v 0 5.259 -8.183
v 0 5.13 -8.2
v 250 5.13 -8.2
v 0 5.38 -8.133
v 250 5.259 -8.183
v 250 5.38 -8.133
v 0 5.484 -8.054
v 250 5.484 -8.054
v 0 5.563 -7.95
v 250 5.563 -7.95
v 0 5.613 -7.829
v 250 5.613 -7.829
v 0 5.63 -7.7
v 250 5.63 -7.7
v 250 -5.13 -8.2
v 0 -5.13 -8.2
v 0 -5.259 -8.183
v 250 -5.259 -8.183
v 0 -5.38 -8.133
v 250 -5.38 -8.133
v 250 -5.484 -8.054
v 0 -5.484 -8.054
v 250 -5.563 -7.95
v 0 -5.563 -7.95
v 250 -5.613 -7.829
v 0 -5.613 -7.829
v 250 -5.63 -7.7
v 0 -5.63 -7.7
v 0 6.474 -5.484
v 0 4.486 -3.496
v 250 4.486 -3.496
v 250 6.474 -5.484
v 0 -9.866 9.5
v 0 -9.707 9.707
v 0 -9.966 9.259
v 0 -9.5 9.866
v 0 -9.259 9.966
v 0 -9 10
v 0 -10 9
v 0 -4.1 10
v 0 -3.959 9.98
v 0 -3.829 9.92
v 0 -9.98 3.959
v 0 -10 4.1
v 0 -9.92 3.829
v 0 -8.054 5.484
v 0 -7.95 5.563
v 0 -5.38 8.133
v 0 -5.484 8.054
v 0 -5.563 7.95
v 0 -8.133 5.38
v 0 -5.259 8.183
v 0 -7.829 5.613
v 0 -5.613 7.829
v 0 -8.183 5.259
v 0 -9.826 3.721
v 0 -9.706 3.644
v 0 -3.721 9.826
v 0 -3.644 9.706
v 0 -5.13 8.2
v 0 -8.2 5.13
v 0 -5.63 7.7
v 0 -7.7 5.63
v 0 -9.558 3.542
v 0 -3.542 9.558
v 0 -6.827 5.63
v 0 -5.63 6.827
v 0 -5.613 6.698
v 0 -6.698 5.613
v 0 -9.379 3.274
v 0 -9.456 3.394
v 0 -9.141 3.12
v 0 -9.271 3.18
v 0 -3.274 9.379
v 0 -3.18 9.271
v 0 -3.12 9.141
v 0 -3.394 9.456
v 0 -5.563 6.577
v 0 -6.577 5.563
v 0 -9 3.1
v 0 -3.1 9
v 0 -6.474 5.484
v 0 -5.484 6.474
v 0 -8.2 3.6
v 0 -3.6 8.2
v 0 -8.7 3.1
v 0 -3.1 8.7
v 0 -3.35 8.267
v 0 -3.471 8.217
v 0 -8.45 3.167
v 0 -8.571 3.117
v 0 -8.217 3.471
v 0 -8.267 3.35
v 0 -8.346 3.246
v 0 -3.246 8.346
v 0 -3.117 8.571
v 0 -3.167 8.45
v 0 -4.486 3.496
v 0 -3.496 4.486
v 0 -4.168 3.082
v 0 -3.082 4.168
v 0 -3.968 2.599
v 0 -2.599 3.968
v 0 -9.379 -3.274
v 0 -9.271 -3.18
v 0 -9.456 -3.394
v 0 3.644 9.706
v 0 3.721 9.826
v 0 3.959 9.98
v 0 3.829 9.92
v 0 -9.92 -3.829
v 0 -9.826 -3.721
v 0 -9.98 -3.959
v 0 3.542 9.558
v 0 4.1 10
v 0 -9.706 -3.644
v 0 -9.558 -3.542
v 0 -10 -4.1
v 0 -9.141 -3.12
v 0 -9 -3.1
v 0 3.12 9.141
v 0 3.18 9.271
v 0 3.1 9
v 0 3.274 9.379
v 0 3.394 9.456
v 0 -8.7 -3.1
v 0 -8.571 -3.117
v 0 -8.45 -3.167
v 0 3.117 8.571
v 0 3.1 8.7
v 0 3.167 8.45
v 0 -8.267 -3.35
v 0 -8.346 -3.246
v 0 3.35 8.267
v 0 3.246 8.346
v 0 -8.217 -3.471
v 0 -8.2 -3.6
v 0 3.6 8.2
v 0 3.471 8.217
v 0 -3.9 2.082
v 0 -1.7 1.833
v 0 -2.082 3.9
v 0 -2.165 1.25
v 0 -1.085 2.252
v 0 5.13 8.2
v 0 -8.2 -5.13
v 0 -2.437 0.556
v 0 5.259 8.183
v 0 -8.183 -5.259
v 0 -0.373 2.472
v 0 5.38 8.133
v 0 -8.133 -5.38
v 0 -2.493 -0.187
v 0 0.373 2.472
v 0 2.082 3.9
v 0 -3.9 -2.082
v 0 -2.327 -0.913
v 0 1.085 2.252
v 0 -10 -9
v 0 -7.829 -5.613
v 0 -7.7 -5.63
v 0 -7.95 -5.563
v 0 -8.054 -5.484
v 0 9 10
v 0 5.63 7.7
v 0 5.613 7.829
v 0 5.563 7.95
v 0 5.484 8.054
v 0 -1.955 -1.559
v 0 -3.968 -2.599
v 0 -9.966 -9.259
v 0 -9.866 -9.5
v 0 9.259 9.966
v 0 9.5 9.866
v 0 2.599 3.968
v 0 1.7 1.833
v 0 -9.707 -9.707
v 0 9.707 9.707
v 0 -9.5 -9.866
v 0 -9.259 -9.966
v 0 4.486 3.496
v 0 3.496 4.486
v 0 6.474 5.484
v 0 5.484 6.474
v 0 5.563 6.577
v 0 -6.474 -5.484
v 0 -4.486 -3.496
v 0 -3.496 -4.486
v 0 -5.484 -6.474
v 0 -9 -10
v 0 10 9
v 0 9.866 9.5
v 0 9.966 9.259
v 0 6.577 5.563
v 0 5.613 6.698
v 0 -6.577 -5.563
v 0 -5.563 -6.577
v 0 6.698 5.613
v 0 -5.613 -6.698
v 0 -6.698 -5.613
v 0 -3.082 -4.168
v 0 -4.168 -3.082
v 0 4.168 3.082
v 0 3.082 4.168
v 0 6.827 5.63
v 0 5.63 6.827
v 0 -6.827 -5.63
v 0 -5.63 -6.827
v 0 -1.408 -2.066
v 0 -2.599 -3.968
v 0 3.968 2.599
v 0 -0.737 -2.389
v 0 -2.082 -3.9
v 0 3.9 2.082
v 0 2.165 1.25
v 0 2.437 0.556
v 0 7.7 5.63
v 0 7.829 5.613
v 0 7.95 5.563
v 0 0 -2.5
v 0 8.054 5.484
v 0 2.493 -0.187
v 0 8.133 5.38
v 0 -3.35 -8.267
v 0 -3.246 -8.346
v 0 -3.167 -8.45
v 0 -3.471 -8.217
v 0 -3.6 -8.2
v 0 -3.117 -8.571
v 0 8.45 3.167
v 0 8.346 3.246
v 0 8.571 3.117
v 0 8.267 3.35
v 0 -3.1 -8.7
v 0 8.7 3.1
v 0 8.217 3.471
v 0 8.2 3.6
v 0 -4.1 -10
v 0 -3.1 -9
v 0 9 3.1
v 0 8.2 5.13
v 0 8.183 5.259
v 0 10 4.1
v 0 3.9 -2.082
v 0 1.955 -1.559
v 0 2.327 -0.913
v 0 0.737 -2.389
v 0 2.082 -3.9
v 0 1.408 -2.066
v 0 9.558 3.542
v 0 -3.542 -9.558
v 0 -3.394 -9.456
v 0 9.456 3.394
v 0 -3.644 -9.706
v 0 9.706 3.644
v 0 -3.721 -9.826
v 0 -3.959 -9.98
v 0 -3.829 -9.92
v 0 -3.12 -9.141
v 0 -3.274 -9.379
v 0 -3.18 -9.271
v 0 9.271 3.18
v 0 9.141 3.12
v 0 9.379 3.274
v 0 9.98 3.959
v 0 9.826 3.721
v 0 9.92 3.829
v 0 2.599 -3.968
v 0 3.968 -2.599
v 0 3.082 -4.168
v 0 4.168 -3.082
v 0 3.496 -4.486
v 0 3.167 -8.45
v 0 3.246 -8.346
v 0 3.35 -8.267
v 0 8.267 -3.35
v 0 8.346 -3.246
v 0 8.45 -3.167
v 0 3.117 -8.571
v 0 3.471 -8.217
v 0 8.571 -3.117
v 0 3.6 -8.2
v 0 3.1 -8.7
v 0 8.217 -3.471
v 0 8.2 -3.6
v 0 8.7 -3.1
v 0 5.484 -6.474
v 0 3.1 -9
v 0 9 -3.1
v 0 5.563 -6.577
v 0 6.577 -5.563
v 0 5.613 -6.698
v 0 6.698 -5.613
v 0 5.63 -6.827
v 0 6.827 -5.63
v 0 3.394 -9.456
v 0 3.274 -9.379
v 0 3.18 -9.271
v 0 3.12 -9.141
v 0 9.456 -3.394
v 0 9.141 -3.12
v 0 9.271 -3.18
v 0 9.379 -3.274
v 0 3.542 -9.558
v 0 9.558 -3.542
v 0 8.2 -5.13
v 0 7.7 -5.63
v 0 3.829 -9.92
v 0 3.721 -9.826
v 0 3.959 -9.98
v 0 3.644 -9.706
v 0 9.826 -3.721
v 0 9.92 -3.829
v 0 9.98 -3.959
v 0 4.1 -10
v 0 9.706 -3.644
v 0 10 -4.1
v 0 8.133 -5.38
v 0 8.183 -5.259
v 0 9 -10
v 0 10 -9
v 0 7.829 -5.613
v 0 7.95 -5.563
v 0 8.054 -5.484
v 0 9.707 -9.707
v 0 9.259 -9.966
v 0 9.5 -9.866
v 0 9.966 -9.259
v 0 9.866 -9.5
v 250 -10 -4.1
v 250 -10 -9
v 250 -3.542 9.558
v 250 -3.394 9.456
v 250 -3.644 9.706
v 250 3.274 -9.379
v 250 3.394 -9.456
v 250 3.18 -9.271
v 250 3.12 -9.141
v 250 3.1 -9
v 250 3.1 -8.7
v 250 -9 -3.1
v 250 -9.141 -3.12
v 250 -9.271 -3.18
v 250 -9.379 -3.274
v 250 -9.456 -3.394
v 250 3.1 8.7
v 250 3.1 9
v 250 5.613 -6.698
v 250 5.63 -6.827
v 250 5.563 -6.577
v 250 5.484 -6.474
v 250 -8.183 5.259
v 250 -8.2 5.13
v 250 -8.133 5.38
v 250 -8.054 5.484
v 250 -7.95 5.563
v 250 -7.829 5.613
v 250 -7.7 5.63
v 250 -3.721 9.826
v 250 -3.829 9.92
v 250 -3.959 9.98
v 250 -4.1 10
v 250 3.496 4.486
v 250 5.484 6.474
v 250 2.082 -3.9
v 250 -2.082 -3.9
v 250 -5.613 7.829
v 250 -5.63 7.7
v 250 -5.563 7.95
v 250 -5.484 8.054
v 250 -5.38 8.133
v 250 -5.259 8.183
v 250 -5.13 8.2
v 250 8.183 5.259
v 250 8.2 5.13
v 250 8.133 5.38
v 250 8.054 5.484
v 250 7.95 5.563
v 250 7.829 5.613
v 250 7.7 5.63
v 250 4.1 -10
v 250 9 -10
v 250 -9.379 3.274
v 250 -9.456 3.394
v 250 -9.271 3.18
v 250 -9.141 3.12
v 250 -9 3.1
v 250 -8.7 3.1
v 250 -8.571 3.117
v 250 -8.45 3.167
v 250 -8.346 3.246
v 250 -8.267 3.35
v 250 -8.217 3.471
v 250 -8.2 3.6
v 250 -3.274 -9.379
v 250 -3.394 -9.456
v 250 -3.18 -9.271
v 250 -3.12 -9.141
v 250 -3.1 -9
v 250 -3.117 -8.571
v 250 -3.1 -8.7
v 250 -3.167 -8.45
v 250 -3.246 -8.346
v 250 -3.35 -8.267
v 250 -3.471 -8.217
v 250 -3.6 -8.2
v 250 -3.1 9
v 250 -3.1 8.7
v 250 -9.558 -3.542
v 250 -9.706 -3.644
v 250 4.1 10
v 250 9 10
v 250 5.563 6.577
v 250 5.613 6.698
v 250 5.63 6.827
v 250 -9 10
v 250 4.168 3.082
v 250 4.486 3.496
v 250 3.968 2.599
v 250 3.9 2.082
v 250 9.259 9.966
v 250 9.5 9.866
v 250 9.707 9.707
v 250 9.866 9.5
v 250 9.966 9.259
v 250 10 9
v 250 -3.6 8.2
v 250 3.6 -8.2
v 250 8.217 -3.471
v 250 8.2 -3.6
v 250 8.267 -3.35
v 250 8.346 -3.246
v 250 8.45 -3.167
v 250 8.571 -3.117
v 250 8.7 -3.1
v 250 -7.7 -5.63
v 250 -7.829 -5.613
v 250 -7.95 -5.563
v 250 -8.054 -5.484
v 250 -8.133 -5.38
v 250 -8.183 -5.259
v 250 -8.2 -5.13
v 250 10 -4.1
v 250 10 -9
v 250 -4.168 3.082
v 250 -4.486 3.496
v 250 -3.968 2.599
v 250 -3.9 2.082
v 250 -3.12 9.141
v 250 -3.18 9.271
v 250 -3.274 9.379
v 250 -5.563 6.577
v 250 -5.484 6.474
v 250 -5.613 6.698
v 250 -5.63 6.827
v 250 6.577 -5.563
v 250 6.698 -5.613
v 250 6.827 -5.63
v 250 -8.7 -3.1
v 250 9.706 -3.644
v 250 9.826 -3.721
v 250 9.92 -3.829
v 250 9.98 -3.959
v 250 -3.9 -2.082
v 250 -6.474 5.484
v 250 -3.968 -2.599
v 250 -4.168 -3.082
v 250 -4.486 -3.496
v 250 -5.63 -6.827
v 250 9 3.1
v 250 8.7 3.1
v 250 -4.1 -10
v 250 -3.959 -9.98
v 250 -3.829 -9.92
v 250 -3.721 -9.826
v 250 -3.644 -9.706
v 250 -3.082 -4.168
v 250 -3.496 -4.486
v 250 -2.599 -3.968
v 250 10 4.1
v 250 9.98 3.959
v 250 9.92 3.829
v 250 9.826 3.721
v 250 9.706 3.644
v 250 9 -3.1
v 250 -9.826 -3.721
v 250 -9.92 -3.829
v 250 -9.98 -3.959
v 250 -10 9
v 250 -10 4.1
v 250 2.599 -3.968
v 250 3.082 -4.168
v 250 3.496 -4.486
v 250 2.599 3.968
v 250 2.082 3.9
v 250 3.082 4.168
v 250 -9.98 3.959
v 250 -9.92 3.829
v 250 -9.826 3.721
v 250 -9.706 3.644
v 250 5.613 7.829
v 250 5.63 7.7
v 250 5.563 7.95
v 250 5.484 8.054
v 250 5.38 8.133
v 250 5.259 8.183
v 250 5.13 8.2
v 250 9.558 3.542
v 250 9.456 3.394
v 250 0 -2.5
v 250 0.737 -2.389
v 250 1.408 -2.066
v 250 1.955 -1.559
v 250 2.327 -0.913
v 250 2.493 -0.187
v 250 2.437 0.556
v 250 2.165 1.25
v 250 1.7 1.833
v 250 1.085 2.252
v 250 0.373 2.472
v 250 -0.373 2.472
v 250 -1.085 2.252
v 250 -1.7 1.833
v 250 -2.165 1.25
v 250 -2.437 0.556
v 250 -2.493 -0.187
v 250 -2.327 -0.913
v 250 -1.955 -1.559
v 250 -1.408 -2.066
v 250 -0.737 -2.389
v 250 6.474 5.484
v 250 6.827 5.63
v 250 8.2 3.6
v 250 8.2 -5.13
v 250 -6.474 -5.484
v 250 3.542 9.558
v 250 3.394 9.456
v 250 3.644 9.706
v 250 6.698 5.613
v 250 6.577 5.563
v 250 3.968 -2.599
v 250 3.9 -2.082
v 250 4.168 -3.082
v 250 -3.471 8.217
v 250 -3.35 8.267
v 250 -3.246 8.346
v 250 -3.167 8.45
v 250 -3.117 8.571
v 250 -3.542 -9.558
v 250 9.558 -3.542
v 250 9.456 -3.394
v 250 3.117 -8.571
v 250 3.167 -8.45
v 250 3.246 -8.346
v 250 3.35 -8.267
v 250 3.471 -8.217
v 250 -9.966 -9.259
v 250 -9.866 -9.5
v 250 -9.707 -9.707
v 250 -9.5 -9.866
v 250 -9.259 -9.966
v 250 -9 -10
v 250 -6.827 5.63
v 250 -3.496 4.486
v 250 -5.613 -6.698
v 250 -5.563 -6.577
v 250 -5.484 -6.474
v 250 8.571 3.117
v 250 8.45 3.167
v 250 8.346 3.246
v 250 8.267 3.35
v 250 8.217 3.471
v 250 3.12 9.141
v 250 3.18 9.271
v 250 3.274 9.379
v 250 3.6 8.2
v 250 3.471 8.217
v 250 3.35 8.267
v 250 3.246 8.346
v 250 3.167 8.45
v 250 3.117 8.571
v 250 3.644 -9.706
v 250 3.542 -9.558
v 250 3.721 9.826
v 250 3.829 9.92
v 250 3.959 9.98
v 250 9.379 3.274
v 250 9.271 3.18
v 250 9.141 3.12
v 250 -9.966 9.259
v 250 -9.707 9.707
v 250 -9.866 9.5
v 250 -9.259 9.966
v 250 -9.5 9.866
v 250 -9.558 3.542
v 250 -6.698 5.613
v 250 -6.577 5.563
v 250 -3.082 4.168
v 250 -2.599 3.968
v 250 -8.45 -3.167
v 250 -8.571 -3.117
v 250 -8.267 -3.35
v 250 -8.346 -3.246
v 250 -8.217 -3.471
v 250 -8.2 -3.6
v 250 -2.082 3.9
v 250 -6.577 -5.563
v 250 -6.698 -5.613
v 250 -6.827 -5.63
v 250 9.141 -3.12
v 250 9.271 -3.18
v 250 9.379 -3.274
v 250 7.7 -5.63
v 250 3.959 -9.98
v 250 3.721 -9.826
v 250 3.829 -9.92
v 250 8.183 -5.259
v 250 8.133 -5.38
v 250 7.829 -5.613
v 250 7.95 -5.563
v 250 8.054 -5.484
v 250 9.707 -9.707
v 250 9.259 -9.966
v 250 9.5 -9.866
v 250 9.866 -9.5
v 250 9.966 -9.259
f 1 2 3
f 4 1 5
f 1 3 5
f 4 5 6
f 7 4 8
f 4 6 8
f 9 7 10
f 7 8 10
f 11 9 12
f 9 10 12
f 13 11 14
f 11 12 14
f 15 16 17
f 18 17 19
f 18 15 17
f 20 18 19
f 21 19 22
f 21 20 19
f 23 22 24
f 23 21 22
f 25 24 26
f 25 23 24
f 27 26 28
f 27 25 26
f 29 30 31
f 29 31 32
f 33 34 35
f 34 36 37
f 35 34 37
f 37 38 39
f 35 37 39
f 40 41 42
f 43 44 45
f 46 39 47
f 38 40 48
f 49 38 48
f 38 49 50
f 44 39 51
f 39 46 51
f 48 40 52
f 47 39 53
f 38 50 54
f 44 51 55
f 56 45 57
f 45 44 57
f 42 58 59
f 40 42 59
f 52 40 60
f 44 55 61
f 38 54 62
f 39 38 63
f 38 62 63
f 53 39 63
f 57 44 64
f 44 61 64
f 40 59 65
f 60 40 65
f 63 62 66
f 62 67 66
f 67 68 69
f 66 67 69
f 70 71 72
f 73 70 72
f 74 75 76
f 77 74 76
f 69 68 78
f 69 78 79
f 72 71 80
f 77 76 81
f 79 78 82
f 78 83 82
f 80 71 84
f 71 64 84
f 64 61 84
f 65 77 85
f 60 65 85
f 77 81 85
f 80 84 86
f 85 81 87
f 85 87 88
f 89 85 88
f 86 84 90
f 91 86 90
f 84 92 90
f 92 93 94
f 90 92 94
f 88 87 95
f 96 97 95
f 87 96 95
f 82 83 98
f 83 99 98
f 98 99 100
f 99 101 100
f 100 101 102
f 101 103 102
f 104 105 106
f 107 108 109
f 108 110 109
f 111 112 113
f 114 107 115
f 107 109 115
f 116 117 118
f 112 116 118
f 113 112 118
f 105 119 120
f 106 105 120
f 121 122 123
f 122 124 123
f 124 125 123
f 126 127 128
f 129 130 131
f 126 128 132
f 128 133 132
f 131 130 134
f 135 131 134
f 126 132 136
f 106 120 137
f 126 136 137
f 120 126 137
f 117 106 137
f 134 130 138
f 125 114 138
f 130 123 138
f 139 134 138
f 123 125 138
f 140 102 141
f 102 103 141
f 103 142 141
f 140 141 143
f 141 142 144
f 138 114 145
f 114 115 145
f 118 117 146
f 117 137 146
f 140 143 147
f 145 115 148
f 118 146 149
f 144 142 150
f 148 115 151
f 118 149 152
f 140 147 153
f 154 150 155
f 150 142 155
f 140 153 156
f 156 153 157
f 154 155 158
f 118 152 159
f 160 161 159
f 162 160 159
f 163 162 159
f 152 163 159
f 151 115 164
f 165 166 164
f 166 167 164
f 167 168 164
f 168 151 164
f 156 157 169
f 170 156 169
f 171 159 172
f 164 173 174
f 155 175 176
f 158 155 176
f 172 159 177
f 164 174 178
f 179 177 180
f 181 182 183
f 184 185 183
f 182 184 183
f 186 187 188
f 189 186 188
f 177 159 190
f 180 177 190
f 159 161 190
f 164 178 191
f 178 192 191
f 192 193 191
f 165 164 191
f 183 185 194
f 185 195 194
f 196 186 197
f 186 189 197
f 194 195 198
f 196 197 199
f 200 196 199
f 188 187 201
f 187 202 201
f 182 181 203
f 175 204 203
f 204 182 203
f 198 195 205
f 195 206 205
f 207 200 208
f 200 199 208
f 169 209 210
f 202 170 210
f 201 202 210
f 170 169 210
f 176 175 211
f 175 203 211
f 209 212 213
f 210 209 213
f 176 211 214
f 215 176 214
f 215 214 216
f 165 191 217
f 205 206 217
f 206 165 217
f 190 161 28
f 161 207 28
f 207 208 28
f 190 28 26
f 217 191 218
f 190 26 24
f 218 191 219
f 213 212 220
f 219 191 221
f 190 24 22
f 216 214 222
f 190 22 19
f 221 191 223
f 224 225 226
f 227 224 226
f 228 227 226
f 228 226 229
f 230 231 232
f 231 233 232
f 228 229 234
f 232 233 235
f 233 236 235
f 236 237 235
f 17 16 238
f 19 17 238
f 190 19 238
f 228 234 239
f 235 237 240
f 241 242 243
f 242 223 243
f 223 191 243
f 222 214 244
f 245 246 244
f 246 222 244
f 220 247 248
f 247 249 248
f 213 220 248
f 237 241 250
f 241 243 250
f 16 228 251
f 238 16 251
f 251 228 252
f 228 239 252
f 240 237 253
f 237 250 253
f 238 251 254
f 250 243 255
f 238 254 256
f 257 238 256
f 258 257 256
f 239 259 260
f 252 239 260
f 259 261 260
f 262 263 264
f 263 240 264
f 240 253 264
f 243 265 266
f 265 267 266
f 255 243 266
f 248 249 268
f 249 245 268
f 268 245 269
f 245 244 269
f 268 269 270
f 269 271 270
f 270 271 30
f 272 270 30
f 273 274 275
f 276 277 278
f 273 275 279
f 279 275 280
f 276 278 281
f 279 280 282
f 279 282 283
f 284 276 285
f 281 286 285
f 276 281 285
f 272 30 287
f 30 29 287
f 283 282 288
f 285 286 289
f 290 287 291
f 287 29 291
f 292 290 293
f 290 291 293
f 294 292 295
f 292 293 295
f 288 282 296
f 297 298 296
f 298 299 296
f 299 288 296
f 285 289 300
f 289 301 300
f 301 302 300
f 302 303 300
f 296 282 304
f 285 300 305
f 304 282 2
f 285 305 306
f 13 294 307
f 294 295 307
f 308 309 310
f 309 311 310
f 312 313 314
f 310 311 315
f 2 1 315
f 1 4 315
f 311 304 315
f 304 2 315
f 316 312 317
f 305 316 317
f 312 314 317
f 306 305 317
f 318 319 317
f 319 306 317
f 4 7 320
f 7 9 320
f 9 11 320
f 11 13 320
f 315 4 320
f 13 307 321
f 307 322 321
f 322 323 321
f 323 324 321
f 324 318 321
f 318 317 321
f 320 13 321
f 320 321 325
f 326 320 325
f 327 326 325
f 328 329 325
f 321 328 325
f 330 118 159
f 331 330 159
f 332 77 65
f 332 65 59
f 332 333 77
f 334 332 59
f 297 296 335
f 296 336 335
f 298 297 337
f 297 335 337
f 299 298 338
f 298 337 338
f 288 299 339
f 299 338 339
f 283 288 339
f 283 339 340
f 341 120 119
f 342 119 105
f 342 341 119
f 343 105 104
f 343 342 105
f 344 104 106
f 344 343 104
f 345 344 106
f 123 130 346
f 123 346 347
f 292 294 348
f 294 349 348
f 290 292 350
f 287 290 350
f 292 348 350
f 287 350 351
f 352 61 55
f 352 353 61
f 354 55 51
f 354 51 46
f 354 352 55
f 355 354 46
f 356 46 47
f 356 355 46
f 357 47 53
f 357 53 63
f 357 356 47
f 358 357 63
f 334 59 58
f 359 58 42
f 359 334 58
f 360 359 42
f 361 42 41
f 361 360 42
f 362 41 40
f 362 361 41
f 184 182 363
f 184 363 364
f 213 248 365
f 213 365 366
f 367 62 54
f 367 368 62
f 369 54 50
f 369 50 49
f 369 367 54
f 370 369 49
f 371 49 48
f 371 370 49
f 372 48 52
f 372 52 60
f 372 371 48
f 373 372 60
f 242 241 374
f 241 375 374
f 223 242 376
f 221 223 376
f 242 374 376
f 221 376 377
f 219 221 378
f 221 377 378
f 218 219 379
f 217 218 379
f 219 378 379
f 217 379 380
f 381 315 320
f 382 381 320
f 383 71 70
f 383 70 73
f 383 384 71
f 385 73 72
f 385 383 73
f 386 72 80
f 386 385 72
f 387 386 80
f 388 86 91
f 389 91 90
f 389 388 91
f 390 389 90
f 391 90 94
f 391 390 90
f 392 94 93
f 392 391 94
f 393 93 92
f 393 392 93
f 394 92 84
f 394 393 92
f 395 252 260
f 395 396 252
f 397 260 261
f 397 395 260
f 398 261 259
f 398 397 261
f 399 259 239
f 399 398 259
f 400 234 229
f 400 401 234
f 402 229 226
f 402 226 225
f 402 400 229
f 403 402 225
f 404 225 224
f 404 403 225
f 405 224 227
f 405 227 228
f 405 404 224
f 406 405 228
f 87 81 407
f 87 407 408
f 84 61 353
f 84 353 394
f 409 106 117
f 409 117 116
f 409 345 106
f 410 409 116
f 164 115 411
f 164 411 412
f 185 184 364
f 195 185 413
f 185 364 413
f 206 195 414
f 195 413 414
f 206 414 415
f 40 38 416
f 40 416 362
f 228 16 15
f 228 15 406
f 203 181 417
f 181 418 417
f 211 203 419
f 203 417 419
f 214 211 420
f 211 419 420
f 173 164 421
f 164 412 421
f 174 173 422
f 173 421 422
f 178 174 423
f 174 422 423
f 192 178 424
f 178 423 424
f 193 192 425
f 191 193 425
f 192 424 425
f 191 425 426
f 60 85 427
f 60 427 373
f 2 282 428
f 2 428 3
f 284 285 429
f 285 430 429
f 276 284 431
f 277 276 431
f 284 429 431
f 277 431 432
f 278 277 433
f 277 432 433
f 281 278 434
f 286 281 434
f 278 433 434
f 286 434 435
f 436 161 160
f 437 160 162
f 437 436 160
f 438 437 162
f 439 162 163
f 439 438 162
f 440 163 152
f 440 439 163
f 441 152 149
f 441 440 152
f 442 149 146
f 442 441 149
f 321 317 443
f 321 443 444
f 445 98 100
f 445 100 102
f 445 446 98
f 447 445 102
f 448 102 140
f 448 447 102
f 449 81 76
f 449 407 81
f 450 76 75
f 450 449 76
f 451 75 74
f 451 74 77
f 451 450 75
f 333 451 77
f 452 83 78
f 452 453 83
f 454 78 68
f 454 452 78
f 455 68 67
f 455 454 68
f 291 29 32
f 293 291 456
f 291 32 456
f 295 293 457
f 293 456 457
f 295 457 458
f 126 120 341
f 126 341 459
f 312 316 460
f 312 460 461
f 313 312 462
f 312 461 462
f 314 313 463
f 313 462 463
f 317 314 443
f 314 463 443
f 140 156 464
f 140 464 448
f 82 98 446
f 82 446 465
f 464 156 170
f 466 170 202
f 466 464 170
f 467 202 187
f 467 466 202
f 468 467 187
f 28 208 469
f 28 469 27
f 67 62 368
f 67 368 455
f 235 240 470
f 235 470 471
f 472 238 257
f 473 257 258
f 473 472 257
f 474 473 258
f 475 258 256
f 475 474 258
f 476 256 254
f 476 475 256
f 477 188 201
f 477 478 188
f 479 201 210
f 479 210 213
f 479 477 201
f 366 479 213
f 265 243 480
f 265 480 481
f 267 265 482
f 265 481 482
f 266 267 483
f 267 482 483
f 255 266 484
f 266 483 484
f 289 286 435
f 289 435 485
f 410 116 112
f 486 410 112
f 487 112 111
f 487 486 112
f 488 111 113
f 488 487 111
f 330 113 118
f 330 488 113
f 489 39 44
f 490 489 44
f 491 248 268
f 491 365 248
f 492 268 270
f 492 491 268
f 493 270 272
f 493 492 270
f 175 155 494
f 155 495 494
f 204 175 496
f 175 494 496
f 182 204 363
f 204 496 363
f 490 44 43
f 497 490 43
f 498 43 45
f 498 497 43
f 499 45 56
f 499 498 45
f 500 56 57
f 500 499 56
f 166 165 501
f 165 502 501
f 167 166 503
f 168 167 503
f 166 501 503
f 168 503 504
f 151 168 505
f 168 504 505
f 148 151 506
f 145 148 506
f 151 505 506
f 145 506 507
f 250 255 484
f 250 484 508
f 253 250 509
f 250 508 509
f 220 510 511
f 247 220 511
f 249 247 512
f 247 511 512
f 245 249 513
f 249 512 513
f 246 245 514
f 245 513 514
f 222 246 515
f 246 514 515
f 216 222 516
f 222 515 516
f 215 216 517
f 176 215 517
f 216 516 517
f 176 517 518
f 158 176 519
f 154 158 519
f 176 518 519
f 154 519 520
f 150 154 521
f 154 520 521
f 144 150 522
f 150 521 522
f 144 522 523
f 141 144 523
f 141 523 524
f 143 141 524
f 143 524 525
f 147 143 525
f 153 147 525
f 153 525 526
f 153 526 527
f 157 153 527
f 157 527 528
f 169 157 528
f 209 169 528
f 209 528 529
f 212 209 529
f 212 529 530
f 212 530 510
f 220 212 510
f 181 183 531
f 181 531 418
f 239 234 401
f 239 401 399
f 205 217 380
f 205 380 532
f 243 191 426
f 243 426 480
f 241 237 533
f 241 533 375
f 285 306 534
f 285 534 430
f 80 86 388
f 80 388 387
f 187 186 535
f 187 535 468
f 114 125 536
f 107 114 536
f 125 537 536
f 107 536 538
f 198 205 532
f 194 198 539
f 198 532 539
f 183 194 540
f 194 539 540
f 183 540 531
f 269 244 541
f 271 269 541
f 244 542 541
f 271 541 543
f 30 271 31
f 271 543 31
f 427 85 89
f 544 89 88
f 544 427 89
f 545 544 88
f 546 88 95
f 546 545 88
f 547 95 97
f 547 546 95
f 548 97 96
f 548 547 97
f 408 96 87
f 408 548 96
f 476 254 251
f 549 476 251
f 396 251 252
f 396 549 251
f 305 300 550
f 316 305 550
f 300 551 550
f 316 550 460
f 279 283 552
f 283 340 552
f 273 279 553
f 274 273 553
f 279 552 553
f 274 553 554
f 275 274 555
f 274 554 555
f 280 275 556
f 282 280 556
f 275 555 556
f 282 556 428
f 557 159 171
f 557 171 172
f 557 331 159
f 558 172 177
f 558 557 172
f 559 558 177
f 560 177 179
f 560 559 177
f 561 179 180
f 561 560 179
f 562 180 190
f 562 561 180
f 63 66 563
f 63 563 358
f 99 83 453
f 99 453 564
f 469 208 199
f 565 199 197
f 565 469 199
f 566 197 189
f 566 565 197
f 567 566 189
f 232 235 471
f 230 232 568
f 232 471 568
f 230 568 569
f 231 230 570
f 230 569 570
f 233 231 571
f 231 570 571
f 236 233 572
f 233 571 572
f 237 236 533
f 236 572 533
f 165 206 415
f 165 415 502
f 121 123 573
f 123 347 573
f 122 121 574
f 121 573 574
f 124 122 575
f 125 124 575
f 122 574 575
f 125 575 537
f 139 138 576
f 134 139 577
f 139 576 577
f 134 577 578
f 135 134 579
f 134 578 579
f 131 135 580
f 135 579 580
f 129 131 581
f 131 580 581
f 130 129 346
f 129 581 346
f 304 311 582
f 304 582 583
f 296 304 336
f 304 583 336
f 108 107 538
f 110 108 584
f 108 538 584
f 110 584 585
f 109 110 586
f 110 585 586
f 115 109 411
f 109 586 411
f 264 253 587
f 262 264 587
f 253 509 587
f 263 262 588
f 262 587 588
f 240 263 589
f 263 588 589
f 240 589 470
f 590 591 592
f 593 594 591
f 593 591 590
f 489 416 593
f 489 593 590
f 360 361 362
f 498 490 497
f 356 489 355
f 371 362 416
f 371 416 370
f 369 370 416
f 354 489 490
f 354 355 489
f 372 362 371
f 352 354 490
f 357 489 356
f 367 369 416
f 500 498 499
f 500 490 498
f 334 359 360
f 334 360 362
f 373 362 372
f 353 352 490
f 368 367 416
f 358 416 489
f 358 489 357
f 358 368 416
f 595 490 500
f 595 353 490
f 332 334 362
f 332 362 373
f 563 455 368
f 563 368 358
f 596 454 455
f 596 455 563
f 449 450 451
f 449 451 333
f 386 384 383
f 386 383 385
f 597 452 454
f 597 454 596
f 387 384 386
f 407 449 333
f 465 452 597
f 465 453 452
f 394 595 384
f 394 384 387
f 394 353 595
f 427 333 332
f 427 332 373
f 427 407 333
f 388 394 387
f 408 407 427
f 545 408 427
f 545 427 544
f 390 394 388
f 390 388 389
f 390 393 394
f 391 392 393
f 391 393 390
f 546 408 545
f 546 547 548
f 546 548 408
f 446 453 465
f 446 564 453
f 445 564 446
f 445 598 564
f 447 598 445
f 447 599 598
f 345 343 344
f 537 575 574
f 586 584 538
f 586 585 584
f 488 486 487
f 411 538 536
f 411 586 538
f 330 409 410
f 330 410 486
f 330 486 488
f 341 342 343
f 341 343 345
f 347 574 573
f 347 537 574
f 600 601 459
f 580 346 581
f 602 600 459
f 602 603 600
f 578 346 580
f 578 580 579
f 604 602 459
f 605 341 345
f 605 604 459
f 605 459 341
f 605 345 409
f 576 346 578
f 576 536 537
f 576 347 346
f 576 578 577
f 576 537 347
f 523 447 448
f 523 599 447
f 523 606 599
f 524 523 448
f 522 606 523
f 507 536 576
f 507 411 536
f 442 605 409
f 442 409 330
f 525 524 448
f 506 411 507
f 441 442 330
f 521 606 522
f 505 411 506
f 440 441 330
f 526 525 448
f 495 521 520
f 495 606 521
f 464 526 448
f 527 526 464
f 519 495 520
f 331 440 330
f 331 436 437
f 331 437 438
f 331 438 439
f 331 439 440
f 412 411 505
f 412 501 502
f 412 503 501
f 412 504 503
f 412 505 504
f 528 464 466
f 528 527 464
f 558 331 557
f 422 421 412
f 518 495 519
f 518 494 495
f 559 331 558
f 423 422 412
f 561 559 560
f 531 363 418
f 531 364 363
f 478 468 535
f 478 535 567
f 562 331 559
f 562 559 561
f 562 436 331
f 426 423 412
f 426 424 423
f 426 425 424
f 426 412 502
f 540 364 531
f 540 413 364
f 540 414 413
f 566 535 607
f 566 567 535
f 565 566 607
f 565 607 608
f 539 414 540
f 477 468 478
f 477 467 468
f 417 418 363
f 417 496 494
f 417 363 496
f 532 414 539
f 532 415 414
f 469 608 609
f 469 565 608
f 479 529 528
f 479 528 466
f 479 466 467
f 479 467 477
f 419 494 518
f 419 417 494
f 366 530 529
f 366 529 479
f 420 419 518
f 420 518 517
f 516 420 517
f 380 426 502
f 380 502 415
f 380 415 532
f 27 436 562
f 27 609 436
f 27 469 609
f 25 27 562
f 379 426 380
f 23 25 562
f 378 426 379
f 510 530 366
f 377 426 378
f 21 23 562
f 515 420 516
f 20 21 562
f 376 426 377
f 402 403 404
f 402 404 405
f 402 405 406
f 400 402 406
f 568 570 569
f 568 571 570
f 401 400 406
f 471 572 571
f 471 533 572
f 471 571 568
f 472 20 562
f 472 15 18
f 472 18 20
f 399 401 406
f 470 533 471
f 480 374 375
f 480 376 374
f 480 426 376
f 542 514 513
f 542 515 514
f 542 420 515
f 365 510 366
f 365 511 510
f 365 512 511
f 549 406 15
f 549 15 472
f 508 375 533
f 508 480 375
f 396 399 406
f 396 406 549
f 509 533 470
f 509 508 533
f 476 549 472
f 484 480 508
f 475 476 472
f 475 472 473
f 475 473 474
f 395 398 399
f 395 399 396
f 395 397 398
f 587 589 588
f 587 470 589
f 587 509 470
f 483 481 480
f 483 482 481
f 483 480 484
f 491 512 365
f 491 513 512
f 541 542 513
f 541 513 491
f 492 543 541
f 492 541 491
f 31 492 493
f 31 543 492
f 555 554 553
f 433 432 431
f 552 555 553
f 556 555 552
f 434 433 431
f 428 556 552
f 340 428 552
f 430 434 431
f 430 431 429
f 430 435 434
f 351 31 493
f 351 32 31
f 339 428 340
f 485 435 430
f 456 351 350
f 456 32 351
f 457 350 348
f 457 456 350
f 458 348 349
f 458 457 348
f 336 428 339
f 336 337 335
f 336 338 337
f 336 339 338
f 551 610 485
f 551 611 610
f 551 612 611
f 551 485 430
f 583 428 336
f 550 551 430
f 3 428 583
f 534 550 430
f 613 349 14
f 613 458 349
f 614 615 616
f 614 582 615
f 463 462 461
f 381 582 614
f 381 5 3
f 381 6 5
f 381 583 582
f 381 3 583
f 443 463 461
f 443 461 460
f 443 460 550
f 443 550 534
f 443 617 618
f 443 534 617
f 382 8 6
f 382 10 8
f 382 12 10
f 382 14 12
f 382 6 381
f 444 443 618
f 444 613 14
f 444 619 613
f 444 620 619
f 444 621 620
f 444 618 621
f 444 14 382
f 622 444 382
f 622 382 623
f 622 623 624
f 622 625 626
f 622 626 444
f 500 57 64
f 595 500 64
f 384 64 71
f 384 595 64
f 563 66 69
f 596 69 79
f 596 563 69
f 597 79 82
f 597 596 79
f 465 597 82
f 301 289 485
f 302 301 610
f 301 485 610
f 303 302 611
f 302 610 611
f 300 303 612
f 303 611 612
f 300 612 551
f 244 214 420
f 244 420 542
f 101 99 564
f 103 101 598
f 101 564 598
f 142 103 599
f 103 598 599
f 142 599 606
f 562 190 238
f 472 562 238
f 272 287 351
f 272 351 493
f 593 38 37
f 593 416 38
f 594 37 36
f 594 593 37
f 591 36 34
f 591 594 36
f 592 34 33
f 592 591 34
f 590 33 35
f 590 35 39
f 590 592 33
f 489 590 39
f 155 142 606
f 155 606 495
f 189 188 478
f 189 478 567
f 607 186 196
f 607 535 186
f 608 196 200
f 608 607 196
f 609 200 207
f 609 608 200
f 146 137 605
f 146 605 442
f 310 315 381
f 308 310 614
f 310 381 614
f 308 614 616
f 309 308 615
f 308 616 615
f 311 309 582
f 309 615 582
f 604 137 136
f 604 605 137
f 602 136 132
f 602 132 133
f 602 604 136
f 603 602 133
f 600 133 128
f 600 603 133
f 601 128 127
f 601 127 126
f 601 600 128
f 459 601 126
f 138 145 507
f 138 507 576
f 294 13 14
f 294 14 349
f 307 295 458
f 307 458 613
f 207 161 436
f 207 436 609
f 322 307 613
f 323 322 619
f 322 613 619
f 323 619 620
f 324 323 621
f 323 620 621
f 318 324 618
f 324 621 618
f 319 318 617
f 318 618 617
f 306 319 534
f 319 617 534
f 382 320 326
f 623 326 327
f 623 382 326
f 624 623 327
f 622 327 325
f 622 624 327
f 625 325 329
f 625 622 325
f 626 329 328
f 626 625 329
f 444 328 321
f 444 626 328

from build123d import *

# Parameters (mm, degrees)
SKETCH1_W                = 20
SKETCH1_H                = 20
BOSS_EXTRUDE1_DEPTH      = 250
FILLET1_R                = 1
CUT_EXTRUDE1_DEPTH       = 251.399680511
F_5_0_5_DIAMETER_HOLE1_D = 5
FILLET2_R                = 2
FILLET3_R                = 0.5
FILLET4_R                = 0.5
FILLET5_R                = 0.5


with BuildPart() as part:
    # Sketch1 → Boss-Extrude1 (new body)
    with BuildSketch(Plane(origin=(0, 0, 0), x_dir=(0, 0, -1), z_dir=(1, 0, 0))):
        Rectangle(SKETCH1_W, SKETCH1_H)
    extrude(amount=BOSS_EXTRUDE1_DEPTH)

    # Fillet1
    fillet1_edges = [part.edges().sort_by_distance(p)[0] for p in [
        (125, 10, 10),
        (125, 10, -10),
        (125, -10, -10),
        (125, -10, 10),
    ]]
    fillet(fillet1_edges, radius=FILLET1_R)

    # Sketch3 → Cut-Extrude1 (cut, through all)
    with BuildSketch(Plane.ZY):
        Polygon((-3.6, 10), (3.6, 10), (3.6, 9.5), (3.1, 9.5), (3.1, 8.2), (5.63, 8.2), (5.63, 6.619949494), (2.910050506, 3.9), (-2.910050506, 3.9), (-5.63, 6.619949494), (-5.63, 8.2), (-3.1, 8.2), (-3.1, 9.5), (-3.6, 9.5), align=None)
        Polygon((10, 3.6), (10, -3.6), (9.5, -3.6), (9.5, -3.1), (8.2, -3.1), (8.2, -5.63), (6.619949494, -5.63), (3.9, -2.910050506), (3.9, 2.910050506), (6.619949494, 5.63), (8.2, 5.63), (8.2, 3.1), (9.5, 3.1), (9.5, 3.6), align=None)
        Polygon((3.6, -10), (-3.6, -10), (-3.6, -9.5), (-3.1, -9.5), (-3.1, -8.2), (-5.63, -8.2), (-5.63, -6.619949494), (-2.910050506, -3.9), (2.910050506, -3.9), (5.63, -6.619949494), (5.63, -8.2), (3.1, -8.2), (3.1, -9.5), (3.6, -9.5), align=None)
        Polygon((-10, -3.6), (-10, 3.6), (-9.5, 3.6), (-9.5, 3.1), (-8.2, 3.1), (-8.2, 5.63), (-6.619949494, 5.63), (-3.9, 2.910050506), (-3.9, -2.910050506), (-6.619949494, -5.63), (-8.2, -5.63), (-8.2, -3.1), (-9.5, -3.1), (-9.5, -3.6), align=None)
    extrude(amount=-CUT_EXTRUDE1_DEPTH, mode=Mode.SUBTRACT)

    # Ø5.0 (5) Diameter Hole1 (through all)
    with Locations(Plane.ZY):
        with Locations((0, 0)):
            Hole(F_5_0_5_DIAMETER_HOLE1_D / 2)

    # Fillet2
    fillet2_edges = [part.edges().sort_by_distance(p)[0] for p in [
        (125, -3.9, -2.910050506),
        (125, -3.9, 2.910050506),
        (125, 2.910050506, -3.9),
        (125, -2.910050506, -3.9),
        (125, -2.910050506, 3.9),
        (125, 2.910050506, 3.9),
        (125, 3.9, 2.910050506),
        (125, 3.9, -2.910050506),
    ]]
    fillet(fillet2_edges, radius=FILLET2_R)

    # Fillet3
    fillet3_edges = [part.edges().sort_by_distance(p)[0] for p in [
        (125, 3.6, -10),
        (125, 3.1, -9.5),
        (125, 3.1, -8.2),
        (125, 5.63, -8.2),
        (125, 5.63, -6.619949494),
        (125, 3.6, 10),
        (125, 3.1, 9.5),
        (125, 3.1, 8.2),
        (125, 5.63, 8.2),
        (125, 5.63, 6.619949494),
        (125, 6.619949494, 5.63),
        (125, 8.2, 5.63),
        (125, 8.2, 3.1),
        (125, 9.5, 3.1),
        (125, 10, 3.6),
        (125, 9.5, -3.1),
        (125, 10, -3.6),
        (125, 8.2, -3.1),
        (125, 8.2, -5.63),
        (125, 6.619949494, -5.63),
    ]]
    fillet(fillet3_edges, radius=FILLET3_R - 0.0001)  # a hair under: the kernel refuses the full size

    # Fillet4
    fillet4_edges = [part.edges().sort_by_distance(p)[0] for p in [
        (125, -3.6, 10),
        (125, -3.1, 9.5),
        (125, -3.1, 8.2),
        (125, -5.63, 8.2),
        (125, -5.63, 6.619949494),
        (125, -6.619949494, 5.63),
        (125, -8.2, 5.63),
        (125, -8.2, 3.1),
        (125, -10, 3.6),
        (125, -9.5, 3.1),
        (125, -10, -3.6),
        (125, -9.5, -3.1),
        (125, -8.2, -3.1),
        (125, -8.2, -5.63),
        (125, -6.619949494, -5.63),
        (125, -5.63, -6.619949494),
        (125, -5.63, -8.2),
        (125, -3.1, -8.2),
        (125, -3.1, -9.5),
        (125, -3.6, -10),
    ]]
    fillet(fillet4_edges, radius=FILLET4_R - 0.0001)  # a hair under: the kernel refuses the full size

    # Fillet5
    fillet5_edges = [part.edges().sort_by_distance(p)[0] for p in [
        (125, 3.6, 9.5),
        (125, 9.5, 3.6),
        (125, 9.5, -3.6),
        (125, 3.6, -9.5),
        (125, -3.6, 9.5),
        (125, -9.5, 3.6),
        (125, -9.5, -3.6),
        (125, -3.6, -9.5),
    ]]
    fillet(fillet5_edges, radius=FILLET5_R)


solid = part.part
